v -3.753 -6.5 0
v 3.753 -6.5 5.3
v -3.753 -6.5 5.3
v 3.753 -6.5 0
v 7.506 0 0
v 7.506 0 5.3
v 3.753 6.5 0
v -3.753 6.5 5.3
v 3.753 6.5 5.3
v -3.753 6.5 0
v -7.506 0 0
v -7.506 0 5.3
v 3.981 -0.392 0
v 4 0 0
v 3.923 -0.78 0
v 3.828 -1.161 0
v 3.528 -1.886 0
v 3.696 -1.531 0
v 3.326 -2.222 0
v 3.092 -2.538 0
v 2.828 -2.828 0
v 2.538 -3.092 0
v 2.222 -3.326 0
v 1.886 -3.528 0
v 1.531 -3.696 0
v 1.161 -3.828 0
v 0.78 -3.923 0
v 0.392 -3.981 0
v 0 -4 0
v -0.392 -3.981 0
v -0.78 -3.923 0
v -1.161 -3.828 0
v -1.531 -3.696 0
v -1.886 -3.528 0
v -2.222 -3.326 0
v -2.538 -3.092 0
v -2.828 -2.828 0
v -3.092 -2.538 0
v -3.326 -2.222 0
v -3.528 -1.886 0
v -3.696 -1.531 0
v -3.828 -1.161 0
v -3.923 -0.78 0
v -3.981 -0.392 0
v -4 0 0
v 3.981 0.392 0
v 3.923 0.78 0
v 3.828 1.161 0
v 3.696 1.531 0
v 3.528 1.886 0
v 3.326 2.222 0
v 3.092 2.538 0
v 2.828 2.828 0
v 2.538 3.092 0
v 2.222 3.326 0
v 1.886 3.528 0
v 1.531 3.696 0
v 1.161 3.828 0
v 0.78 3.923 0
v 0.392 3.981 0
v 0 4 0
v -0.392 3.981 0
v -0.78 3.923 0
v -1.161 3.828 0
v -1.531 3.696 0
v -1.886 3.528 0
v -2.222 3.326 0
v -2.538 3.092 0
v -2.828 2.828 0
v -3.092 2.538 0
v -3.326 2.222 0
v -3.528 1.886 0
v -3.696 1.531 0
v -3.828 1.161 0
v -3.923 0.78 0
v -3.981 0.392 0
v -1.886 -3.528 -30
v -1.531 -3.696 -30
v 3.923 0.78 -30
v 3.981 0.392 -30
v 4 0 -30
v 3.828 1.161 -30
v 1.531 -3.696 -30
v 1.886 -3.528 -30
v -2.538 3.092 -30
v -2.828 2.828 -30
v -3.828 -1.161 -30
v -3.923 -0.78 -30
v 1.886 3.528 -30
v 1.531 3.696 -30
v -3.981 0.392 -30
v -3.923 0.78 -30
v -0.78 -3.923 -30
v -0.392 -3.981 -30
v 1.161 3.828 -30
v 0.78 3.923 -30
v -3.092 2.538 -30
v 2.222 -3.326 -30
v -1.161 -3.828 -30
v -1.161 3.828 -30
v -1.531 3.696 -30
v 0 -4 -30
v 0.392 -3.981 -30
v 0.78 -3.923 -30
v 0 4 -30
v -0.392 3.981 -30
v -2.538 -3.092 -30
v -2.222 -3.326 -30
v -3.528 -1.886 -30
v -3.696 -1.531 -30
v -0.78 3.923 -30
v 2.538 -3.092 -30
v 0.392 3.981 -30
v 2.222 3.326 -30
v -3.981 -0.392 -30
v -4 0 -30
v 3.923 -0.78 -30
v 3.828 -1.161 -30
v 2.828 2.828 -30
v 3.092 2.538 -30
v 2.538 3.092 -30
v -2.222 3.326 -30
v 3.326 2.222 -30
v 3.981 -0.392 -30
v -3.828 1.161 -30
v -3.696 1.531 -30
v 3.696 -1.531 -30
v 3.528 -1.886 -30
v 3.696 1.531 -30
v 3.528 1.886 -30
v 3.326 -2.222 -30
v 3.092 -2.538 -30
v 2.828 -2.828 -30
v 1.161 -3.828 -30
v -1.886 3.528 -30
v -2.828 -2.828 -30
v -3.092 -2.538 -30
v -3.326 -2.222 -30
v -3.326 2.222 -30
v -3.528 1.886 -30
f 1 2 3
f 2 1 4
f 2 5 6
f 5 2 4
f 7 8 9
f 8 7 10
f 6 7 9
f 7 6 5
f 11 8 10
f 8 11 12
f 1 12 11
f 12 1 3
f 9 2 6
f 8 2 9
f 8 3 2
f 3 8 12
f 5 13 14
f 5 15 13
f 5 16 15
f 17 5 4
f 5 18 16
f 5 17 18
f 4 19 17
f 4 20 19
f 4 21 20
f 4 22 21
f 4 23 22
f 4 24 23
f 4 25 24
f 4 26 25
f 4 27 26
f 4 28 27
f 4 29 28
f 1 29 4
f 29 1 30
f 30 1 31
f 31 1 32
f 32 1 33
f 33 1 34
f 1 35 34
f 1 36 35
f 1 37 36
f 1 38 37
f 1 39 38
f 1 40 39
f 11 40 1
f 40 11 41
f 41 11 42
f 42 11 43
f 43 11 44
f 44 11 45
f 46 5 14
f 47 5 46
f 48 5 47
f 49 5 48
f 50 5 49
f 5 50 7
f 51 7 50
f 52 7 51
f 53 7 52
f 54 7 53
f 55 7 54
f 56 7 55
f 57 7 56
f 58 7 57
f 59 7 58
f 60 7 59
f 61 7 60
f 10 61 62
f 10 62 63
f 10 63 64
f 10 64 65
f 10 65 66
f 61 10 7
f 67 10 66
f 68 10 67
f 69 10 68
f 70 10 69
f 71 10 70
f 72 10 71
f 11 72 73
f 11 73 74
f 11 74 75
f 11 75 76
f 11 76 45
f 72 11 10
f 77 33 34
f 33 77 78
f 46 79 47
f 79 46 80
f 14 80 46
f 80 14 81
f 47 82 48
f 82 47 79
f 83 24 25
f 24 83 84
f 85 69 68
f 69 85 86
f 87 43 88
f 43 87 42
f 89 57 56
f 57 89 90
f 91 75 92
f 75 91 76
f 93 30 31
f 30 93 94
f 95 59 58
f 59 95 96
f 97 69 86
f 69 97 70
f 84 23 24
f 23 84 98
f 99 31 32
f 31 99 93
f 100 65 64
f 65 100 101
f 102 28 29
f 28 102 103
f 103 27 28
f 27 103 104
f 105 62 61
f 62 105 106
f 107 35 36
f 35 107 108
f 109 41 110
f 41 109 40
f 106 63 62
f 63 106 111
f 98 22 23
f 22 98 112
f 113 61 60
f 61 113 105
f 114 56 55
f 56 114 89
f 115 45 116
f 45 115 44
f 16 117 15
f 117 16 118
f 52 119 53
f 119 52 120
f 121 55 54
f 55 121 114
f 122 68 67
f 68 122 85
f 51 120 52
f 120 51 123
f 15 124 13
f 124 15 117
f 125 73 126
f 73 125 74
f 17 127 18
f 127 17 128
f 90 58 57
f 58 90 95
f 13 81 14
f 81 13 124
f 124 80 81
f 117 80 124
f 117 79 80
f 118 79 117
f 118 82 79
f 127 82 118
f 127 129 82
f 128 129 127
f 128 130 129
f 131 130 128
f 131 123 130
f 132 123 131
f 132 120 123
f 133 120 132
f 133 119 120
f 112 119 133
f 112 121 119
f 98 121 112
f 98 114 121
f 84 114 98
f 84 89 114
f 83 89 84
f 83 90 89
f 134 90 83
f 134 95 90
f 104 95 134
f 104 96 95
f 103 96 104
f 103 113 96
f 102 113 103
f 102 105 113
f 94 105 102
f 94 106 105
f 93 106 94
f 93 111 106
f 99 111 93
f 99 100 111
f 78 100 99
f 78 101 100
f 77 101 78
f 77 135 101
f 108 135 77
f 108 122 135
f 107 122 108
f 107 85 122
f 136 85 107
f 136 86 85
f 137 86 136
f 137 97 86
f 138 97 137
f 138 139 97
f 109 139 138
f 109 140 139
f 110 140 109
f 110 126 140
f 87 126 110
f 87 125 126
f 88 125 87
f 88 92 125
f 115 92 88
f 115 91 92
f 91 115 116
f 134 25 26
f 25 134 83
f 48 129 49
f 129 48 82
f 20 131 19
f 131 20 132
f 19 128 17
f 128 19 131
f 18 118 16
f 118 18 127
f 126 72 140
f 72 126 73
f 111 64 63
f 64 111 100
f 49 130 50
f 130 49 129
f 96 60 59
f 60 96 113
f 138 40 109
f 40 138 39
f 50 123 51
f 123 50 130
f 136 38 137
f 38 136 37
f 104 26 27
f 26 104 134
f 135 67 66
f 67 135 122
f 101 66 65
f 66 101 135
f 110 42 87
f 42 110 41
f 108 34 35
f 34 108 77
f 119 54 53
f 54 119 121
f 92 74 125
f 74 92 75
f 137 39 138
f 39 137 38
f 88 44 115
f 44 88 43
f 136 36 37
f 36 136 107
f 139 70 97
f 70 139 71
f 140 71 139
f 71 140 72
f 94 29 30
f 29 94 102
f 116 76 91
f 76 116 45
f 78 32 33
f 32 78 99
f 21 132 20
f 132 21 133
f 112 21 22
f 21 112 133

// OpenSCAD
// M8 Hex Bolt (Simplified)

$fn = 64;

// Head: Hexagonal prism
// Across-flats (AF) = 13mm -> Circumradius = (AF/2) / cos(30)
translate([0, 0, 0])
    cylinder(h = 5.3, d = 13 / cos(30), $fn = 6);

// Shank: Cylinder
// Diameter = 8mm, Length = 30mm
// Positioned from z=0 to z=-30
translate([0, 0, -30])
    cylinder(h = 30, d = 8);
